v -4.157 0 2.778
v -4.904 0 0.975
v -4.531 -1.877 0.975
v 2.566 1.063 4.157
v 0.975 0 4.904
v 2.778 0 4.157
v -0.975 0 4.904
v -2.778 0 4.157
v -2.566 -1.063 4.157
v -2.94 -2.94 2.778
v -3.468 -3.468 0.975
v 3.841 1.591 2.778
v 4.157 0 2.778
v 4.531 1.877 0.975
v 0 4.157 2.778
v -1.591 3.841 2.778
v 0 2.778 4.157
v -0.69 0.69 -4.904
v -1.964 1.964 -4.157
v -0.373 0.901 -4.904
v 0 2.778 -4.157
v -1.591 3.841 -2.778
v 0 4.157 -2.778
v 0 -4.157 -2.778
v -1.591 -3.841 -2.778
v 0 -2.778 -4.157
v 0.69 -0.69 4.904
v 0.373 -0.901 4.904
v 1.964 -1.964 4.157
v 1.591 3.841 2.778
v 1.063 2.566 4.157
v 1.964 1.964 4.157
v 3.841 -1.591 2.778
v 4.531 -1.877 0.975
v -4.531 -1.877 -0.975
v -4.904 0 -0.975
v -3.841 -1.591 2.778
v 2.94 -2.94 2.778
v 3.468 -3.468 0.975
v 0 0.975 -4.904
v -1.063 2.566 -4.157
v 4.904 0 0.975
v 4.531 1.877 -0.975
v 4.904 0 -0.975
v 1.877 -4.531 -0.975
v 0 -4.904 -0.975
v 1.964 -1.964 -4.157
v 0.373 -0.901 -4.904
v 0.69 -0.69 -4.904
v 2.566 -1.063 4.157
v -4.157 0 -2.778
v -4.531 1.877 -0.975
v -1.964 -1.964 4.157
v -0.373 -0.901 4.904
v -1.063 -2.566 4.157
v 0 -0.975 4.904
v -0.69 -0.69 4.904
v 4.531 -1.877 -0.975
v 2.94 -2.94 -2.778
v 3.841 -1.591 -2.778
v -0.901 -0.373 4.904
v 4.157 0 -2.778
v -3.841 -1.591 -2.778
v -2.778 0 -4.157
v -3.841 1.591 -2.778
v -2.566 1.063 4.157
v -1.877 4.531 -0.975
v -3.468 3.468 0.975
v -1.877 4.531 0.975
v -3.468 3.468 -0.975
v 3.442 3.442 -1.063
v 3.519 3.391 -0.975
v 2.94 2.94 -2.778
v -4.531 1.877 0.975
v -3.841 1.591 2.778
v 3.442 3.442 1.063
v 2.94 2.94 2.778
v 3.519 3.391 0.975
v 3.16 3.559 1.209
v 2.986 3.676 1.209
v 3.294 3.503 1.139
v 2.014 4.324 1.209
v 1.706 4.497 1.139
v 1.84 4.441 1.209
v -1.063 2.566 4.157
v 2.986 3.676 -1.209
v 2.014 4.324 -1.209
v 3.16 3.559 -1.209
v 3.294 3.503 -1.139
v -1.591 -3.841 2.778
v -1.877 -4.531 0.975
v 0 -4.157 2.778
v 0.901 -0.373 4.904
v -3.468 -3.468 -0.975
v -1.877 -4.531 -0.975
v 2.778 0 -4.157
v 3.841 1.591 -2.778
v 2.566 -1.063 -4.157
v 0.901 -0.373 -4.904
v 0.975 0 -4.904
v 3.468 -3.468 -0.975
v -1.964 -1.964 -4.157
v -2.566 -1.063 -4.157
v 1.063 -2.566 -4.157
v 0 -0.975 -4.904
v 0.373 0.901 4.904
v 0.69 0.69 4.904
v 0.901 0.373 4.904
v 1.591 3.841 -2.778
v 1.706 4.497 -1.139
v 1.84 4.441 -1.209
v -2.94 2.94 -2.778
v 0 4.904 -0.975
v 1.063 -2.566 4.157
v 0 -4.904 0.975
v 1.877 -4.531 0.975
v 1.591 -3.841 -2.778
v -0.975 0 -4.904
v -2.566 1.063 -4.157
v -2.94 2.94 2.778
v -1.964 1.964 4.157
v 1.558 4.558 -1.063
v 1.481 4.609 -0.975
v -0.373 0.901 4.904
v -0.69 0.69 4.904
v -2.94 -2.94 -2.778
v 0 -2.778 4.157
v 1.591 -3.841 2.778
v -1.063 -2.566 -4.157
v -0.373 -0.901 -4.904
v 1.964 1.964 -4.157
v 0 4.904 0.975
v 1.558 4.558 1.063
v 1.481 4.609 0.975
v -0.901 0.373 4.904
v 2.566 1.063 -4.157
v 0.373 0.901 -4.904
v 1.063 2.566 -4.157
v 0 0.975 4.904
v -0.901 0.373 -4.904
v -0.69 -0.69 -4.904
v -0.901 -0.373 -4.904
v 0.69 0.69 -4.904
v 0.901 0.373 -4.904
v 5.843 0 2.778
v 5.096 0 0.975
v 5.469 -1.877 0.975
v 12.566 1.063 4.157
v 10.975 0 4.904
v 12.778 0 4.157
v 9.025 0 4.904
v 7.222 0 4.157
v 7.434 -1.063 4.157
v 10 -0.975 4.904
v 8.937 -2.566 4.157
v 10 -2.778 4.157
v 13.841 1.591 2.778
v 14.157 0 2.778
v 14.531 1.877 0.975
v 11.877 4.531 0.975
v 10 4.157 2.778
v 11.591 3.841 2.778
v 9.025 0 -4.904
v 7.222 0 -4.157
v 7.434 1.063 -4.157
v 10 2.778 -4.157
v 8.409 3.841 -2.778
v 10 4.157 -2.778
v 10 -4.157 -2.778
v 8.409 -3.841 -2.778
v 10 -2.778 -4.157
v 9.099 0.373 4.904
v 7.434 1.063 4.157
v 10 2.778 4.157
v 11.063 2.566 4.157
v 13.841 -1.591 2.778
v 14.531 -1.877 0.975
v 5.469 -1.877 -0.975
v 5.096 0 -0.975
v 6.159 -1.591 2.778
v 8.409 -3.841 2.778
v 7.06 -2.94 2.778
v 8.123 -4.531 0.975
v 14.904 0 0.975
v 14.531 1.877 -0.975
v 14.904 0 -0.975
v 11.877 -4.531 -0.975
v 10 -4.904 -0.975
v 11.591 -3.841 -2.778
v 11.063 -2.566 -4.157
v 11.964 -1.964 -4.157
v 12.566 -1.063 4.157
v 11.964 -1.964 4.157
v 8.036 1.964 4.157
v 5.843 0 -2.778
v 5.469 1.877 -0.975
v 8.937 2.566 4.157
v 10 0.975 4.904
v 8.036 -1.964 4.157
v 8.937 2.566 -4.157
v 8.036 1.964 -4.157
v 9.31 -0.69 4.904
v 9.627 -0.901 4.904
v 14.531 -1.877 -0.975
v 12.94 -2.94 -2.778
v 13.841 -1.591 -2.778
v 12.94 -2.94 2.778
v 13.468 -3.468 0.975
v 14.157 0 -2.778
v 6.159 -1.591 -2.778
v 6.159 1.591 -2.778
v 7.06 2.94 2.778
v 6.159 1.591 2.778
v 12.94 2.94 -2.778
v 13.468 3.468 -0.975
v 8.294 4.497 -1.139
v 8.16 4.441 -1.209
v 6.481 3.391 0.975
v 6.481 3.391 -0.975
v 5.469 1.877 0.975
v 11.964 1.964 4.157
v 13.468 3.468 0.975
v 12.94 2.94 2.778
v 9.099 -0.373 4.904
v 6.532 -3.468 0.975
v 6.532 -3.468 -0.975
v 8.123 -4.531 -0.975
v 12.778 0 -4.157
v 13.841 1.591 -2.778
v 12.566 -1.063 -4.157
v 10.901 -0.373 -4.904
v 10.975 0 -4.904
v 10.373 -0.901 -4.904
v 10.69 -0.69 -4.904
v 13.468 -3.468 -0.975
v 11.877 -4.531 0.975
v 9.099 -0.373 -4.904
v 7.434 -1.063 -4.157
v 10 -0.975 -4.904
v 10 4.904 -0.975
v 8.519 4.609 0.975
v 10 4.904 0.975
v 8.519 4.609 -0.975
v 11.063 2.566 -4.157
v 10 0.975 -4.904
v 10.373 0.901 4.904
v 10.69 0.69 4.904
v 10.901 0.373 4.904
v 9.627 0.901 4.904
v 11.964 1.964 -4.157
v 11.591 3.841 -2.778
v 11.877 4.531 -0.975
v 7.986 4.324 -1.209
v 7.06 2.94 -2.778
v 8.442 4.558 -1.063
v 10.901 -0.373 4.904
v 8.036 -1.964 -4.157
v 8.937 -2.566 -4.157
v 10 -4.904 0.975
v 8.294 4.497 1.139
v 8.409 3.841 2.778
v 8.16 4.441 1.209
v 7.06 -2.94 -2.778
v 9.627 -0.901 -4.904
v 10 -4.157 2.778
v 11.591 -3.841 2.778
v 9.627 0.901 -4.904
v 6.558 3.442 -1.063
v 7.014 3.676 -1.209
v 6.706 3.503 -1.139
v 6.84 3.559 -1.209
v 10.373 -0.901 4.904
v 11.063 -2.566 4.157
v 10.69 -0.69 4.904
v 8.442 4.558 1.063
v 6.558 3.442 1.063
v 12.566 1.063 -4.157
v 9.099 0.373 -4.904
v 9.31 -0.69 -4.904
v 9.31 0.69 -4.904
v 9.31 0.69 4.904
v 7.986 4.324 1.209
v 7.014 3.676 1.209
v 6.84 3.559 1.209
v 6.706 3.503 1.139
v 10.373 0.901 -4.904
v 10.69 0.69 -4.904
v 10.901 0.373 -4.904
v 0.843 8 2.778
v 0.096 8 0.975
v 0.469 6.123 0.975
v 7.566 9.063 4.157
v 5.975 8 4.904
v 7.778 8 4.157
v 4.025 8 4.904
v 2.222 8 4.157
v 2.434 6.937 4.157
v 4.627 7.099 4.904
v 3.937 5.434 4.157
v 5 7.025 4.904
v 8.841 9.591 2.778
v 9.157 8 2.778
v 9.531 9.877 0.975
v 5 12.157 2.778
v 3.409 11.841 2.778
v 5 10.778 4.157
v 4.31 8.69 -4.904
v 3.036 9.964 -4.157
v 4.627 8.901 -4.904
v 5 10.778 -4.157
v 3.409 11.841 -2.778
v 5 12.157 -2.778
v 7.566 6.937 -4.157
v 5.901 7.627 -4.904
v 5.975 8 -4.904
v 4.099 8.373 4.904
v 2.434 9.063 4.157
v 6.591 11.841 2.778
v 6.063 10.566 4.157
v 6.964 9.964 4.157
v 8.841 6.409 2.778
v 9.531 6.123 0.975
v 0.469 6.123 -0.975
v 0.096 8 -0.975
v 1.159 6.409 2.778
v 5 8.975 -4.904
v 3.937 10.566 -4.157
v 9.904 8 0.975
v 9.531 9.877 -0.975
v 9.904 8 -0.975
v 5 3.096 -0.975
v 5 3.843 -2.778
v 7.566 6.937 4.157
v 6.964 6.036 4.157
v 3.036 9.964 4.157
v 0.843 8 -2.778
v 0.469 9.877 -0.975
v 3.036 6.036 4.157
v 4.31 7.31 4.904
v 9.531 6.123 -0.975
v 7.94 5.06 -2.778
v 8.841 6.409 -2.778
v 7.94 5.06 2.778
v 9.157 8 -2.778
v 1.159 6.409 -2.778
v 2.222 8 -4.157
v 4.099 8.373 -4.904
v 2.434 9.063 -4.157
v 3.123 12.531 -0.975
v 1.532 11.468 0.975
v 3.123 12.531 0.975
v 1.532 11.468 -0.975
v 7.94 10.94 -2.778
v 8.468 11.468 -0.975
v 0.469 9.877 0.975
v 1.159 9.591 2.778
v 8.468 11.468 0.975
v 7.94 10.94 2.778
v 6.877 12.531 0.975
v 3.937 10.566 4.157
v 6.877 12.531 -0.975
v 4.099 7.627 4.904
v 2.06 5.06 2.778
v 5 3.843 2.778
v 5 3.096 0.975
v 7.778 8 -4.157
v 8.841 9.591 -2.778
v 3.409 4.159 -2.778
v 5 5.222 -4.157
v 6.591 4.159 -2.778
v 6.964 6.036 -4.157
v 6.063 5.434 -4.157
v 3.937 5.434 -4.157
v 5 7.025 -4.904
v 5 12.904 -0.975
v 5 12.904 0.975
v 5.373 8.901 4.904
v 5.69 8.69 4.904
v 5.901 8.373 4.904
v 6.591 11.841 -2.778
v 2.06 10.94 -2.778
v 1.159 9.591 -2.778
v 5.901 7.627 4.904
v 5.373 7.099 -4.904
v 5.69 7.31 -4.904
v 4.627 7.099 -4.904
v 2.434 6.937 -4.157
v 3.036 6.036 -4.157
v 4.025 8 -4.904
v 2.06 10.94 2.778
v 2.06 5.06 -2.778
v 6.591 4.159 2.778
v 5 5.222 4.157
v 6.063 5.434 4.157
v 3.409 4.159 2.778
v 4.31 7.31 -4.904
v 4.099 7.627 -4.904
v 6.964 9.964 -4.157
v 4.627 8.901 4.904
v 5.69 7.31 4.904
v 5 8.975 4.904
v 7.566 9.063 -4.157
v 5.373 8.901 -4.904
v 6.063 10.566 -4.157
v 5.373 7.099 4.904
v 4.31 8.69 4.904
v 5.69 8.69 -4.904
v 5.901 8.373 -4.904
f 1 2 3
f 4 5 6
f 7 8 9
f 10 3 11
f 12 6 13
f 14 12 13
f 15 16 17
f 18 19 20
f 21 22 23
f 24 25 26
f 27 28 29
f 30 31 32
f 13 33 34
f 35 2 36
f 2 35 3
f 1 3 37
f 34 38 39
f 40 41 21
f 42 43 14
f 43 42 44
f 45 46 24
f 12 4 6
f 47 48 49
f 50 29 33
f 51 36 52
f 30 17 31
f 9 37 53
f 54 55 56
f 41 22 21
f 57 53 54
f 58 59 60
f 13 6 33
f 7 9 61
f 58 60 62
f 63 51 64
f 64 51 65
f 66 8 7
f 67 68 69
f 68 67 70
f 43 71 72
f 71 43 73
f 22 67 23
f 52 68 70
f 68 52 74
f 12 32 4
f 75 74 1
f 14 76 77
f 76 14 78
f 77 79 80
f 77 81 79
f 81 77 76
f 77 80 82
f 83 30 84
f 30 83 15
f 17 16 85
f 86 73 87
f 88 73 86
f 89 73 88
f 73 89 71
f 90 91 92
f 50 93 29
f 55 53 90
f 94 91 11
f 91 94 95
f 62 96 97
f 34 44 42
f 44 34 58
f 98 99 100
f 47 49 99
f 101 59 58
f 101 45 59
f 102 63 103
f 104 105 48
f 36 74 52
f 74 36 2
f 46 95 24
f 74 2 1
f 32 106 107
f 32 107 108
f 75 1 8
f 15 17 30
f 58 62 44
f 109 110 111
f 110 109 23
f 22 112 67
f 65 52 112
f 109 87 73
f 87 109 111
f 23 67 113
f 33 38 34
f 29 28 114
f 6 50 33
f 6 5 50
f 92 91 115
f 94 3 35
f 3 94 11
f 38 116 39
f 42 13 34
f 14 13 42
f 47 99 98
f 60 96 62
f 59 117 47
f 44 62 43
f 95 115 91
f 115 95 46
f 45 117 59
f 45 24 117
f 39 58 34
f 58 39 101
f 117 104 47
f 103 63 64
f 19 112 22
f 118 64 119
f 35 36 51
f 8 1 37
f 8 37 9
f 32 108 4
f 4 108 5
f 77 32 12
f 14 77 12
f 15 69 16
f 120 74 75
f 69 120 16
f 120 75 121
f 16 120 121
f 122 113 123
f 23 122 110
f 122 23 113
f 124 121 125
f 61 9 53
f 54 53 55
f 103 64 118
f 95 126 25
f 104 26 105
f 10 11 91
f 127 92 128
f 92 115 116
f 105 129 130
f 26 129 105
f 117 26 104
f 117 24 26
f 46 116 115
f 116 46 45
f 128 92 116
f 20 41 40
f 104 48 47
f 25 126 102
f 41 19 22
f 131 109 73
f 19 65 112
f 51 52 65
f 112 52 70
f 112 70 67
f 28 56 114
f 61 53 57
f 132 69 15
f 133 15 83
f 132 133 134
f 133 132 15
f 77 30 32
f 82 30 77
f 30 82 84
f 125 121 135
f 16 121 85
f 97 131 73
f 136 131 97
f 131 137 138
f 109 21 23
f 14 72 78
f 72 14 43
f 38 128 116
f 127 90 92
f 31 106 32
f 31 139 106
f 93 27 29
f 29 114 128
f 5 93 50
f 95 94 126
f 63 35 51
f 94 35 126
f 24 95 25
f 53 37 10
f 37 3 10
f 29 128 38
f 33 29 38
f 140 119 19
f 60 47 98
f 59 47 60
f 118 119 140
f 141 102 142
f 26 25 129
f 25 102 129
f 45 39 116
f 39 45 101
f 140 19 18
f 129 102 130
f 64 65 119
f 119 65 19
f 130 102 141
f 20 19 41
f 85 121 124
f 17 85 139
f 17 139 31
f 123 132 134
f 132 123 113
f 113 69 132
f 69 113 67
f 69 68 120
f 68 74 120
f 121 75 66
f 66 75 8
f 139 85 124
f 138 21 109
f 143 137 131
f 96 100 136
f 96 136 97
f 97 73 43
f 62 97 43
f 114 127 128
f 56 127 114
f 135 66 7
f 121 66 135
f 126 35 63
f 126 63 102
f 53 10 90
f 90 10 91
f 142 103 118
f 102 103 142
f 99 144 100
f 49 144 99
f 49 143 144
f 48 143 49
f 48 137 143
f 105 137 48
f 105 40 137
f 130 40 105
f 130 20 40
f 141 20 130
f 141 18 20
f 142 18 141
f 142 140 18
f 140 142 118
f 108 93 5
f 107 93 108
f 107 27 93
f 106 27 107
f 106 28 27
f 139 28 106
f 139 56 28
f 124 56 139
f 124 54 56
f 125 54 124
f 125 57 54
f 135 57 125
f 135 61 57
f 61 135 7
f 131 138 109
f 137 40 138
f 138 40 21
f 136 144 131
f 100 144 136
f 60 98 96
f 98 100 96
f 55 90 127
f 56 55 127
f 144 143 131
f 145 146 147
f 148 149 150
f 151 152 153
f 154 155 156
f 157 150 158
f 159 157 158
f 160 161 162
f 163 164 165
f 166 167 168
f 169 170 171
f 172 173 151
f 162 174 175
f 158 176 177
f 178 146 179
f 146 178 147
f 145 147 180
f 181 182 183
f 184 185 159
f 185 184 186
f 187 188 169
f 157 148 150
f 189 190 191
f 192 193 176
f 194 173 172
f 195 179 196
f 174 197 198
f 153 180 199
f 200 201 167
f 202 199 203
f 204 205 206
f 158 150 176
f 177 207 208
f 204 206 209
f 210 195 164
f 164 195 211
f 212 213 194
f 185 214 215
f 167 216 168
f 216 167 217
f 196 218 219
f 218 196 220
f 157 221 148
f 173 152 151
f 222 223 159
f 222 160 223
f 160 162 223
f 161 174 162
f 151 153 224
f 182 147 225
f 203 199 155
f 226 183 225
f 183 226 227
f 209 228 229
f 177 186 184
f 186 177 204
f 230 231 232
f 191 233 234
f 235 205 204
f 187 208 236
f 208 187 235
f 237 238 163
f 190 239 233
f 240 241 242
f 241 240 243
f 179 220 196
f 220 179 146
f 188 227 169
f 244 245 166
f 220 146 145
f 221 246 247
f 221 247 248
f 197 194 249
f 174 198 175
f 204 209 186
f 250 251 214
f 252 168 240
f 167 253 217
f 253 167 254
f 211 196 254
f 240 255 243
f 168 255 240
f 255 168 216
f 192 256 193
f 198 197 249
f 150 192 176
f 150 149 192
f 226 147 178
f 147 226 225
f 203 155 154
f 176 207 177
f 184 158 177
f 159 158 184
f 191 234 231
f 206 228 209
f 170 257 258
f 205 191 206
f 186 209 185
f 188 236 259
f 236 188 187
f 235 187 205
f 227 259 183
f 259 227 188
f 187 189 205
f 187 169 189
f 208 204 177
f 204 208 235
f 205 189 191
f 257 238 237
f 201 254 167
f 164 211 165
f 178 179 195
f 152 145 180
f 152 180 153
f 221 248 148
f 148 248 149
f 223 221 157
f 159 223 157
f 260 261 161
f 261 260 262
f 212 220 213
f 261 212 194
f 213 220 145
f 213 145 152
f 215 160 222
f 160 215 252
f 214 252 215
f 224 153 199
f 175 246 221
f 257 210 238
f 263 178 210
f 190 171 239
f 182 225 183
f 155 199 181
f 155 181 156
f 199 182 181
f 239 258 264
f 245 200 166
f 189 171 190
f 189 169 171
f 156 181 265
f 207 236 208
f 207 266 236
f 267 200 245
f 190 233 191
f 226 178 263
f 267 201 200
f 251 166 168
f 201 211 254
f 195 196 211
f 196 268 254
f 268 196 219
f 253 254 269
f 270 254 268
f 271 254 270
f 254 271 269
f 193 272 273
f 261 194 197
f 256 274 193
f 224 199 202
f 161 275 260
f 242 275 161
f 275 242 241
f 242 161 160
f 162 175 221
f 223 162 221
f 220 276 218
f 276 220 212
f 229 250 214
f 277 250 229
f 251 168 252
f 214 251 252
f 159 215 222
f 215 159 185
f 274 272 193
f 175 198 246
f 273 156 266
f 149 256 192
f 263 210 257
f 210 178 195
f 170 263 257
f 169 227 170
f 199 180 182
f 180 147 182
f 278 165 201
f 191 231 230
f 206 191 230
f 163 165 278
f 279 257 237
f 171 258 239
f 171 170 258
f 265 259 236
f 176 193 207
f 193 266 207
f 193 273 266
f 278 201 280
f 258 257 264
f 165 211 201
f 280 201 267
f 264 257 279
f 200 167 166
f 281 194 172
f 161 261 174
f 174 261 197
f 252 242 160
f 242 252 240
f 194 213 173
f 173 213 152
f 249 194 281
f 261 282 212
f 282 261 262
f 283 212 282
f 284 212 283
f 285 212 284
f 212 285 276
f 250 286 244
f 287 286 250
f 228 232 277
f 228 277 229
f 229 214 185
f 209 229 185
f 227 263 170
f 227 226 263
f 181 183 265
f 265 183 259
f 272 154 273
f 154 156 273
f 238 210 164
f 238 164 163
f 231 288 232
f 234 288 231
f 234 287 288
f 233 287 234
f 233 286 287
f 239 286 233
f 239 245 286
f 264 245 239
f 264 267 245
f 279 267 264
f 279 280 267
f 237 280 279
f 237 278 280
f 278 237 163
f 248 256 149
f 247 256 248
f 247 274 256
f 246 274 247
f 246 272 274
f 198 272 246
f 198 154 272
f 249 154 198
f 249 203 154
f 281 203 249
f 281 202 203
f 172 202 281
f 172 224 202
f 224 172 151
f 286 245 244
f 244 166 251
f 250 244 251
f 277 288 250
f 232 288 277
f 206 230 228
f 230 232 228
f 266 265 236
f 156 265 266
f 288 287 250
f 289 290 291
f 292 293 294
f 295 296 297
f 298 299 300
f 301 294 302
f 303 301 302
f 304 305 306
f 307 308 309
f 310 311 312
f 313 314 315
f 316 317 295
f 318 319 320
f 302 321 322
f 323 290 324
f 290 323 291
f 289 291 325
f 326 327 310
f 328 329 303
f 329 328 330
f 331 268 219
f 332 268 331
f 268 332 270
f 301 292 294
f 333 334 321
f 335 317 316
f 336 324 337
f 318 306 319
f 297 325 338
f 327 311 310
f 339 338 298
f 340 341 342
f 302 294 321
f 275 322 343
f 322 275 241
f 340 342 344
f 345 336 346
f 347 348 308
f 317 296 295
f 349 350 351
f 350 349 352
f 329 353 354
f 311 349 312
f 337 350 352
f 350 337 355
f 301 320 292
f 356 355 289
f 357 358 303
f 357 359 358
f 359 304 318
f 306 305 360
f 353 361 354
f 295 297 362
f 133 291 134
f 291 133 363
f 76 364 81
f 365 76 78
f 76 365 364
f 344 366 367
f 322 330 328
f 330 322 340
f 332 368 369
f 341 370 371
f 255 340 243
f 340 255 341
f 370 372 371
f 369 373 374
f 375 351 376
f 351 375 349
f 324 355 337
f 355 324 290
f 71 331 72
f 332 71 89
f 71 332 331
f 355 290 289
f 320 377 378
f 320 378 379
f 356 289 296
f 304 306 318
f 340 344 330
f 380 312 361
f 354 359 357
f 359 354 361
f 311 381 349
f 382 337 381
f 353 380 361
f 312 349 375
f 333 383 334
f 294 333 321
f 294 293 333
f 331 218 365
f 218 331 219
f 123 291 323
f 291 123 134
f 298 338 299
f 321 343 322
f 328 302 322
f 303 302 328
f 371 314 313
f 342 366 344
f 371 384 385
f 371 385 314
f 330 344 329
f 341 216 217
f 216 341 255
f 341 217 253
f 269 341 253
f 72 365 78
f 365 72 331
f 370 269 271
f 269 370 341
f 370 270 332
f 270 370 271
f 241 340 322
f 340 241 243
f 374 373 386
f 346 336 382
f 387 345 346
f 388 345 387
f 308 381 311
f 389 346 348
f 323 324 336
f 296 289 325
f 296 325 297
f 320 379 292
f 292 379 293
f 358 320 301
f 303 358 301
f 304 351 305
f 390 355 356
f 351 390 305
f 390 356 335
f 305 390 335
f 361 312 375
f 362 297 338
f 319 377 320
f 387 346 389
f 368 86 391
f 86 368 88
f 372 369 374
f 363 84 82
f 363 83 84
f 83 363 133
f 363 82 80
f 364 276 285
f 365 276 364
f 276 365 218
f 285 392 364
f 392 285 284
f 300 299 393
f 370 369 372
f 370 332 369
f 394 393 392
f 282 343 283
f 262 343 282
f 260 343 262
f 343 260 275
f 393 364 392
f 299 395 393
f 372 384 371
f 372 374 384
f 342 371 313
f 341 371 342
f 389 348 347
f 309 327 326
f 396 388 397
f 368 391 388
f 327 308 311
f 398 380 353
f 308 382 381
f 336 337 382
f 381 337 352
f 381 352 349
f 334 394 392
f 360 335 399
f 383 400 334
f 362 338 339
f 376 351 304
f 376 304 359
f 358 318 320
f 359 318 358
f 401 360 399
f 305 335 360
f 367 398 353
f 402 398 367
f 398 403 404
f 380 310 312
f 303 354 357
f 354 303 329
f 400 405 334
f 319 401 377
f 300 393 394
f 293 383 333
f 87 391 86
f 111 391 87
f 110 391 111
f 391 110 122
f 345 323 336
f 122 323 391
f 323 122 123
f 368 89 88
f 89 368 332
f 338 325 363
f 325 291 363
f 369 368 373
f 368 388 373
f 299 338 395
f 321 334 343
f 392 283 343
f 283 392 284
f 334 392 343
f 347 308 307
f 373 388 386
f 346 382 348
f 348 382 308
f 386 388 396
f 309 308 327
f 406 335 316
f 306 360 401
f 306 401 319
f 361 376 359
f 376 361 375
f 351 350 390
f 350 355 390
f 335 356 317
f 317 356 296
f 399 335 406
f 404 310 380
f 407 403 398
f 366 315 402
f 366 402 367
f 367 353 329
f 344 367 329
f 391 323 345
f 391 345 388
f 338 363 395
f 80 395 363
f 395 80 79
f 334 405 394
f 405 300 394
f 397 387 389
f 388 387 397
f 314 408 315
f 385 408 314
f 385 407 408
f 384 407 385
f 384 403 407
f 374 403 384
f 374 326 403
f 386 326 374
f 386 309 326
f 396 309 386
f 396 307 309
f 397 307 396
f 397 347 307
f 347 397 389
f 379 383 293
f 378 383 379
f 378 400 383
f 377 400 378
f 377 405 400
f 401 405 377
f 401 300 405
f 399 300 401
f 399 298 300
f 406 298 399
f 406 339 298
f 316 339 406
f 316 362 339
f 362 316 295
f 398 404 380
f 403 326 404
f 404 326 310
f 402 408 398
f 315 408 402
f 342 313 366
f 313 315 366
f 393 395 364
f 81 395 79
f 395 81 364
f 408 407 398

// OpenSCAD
union() {
    sphere(r = 5);
    translate([10, 0, 0]) sphere(r = 5);
    translate([5, 8, 0]) sphere(r = 5);
}
